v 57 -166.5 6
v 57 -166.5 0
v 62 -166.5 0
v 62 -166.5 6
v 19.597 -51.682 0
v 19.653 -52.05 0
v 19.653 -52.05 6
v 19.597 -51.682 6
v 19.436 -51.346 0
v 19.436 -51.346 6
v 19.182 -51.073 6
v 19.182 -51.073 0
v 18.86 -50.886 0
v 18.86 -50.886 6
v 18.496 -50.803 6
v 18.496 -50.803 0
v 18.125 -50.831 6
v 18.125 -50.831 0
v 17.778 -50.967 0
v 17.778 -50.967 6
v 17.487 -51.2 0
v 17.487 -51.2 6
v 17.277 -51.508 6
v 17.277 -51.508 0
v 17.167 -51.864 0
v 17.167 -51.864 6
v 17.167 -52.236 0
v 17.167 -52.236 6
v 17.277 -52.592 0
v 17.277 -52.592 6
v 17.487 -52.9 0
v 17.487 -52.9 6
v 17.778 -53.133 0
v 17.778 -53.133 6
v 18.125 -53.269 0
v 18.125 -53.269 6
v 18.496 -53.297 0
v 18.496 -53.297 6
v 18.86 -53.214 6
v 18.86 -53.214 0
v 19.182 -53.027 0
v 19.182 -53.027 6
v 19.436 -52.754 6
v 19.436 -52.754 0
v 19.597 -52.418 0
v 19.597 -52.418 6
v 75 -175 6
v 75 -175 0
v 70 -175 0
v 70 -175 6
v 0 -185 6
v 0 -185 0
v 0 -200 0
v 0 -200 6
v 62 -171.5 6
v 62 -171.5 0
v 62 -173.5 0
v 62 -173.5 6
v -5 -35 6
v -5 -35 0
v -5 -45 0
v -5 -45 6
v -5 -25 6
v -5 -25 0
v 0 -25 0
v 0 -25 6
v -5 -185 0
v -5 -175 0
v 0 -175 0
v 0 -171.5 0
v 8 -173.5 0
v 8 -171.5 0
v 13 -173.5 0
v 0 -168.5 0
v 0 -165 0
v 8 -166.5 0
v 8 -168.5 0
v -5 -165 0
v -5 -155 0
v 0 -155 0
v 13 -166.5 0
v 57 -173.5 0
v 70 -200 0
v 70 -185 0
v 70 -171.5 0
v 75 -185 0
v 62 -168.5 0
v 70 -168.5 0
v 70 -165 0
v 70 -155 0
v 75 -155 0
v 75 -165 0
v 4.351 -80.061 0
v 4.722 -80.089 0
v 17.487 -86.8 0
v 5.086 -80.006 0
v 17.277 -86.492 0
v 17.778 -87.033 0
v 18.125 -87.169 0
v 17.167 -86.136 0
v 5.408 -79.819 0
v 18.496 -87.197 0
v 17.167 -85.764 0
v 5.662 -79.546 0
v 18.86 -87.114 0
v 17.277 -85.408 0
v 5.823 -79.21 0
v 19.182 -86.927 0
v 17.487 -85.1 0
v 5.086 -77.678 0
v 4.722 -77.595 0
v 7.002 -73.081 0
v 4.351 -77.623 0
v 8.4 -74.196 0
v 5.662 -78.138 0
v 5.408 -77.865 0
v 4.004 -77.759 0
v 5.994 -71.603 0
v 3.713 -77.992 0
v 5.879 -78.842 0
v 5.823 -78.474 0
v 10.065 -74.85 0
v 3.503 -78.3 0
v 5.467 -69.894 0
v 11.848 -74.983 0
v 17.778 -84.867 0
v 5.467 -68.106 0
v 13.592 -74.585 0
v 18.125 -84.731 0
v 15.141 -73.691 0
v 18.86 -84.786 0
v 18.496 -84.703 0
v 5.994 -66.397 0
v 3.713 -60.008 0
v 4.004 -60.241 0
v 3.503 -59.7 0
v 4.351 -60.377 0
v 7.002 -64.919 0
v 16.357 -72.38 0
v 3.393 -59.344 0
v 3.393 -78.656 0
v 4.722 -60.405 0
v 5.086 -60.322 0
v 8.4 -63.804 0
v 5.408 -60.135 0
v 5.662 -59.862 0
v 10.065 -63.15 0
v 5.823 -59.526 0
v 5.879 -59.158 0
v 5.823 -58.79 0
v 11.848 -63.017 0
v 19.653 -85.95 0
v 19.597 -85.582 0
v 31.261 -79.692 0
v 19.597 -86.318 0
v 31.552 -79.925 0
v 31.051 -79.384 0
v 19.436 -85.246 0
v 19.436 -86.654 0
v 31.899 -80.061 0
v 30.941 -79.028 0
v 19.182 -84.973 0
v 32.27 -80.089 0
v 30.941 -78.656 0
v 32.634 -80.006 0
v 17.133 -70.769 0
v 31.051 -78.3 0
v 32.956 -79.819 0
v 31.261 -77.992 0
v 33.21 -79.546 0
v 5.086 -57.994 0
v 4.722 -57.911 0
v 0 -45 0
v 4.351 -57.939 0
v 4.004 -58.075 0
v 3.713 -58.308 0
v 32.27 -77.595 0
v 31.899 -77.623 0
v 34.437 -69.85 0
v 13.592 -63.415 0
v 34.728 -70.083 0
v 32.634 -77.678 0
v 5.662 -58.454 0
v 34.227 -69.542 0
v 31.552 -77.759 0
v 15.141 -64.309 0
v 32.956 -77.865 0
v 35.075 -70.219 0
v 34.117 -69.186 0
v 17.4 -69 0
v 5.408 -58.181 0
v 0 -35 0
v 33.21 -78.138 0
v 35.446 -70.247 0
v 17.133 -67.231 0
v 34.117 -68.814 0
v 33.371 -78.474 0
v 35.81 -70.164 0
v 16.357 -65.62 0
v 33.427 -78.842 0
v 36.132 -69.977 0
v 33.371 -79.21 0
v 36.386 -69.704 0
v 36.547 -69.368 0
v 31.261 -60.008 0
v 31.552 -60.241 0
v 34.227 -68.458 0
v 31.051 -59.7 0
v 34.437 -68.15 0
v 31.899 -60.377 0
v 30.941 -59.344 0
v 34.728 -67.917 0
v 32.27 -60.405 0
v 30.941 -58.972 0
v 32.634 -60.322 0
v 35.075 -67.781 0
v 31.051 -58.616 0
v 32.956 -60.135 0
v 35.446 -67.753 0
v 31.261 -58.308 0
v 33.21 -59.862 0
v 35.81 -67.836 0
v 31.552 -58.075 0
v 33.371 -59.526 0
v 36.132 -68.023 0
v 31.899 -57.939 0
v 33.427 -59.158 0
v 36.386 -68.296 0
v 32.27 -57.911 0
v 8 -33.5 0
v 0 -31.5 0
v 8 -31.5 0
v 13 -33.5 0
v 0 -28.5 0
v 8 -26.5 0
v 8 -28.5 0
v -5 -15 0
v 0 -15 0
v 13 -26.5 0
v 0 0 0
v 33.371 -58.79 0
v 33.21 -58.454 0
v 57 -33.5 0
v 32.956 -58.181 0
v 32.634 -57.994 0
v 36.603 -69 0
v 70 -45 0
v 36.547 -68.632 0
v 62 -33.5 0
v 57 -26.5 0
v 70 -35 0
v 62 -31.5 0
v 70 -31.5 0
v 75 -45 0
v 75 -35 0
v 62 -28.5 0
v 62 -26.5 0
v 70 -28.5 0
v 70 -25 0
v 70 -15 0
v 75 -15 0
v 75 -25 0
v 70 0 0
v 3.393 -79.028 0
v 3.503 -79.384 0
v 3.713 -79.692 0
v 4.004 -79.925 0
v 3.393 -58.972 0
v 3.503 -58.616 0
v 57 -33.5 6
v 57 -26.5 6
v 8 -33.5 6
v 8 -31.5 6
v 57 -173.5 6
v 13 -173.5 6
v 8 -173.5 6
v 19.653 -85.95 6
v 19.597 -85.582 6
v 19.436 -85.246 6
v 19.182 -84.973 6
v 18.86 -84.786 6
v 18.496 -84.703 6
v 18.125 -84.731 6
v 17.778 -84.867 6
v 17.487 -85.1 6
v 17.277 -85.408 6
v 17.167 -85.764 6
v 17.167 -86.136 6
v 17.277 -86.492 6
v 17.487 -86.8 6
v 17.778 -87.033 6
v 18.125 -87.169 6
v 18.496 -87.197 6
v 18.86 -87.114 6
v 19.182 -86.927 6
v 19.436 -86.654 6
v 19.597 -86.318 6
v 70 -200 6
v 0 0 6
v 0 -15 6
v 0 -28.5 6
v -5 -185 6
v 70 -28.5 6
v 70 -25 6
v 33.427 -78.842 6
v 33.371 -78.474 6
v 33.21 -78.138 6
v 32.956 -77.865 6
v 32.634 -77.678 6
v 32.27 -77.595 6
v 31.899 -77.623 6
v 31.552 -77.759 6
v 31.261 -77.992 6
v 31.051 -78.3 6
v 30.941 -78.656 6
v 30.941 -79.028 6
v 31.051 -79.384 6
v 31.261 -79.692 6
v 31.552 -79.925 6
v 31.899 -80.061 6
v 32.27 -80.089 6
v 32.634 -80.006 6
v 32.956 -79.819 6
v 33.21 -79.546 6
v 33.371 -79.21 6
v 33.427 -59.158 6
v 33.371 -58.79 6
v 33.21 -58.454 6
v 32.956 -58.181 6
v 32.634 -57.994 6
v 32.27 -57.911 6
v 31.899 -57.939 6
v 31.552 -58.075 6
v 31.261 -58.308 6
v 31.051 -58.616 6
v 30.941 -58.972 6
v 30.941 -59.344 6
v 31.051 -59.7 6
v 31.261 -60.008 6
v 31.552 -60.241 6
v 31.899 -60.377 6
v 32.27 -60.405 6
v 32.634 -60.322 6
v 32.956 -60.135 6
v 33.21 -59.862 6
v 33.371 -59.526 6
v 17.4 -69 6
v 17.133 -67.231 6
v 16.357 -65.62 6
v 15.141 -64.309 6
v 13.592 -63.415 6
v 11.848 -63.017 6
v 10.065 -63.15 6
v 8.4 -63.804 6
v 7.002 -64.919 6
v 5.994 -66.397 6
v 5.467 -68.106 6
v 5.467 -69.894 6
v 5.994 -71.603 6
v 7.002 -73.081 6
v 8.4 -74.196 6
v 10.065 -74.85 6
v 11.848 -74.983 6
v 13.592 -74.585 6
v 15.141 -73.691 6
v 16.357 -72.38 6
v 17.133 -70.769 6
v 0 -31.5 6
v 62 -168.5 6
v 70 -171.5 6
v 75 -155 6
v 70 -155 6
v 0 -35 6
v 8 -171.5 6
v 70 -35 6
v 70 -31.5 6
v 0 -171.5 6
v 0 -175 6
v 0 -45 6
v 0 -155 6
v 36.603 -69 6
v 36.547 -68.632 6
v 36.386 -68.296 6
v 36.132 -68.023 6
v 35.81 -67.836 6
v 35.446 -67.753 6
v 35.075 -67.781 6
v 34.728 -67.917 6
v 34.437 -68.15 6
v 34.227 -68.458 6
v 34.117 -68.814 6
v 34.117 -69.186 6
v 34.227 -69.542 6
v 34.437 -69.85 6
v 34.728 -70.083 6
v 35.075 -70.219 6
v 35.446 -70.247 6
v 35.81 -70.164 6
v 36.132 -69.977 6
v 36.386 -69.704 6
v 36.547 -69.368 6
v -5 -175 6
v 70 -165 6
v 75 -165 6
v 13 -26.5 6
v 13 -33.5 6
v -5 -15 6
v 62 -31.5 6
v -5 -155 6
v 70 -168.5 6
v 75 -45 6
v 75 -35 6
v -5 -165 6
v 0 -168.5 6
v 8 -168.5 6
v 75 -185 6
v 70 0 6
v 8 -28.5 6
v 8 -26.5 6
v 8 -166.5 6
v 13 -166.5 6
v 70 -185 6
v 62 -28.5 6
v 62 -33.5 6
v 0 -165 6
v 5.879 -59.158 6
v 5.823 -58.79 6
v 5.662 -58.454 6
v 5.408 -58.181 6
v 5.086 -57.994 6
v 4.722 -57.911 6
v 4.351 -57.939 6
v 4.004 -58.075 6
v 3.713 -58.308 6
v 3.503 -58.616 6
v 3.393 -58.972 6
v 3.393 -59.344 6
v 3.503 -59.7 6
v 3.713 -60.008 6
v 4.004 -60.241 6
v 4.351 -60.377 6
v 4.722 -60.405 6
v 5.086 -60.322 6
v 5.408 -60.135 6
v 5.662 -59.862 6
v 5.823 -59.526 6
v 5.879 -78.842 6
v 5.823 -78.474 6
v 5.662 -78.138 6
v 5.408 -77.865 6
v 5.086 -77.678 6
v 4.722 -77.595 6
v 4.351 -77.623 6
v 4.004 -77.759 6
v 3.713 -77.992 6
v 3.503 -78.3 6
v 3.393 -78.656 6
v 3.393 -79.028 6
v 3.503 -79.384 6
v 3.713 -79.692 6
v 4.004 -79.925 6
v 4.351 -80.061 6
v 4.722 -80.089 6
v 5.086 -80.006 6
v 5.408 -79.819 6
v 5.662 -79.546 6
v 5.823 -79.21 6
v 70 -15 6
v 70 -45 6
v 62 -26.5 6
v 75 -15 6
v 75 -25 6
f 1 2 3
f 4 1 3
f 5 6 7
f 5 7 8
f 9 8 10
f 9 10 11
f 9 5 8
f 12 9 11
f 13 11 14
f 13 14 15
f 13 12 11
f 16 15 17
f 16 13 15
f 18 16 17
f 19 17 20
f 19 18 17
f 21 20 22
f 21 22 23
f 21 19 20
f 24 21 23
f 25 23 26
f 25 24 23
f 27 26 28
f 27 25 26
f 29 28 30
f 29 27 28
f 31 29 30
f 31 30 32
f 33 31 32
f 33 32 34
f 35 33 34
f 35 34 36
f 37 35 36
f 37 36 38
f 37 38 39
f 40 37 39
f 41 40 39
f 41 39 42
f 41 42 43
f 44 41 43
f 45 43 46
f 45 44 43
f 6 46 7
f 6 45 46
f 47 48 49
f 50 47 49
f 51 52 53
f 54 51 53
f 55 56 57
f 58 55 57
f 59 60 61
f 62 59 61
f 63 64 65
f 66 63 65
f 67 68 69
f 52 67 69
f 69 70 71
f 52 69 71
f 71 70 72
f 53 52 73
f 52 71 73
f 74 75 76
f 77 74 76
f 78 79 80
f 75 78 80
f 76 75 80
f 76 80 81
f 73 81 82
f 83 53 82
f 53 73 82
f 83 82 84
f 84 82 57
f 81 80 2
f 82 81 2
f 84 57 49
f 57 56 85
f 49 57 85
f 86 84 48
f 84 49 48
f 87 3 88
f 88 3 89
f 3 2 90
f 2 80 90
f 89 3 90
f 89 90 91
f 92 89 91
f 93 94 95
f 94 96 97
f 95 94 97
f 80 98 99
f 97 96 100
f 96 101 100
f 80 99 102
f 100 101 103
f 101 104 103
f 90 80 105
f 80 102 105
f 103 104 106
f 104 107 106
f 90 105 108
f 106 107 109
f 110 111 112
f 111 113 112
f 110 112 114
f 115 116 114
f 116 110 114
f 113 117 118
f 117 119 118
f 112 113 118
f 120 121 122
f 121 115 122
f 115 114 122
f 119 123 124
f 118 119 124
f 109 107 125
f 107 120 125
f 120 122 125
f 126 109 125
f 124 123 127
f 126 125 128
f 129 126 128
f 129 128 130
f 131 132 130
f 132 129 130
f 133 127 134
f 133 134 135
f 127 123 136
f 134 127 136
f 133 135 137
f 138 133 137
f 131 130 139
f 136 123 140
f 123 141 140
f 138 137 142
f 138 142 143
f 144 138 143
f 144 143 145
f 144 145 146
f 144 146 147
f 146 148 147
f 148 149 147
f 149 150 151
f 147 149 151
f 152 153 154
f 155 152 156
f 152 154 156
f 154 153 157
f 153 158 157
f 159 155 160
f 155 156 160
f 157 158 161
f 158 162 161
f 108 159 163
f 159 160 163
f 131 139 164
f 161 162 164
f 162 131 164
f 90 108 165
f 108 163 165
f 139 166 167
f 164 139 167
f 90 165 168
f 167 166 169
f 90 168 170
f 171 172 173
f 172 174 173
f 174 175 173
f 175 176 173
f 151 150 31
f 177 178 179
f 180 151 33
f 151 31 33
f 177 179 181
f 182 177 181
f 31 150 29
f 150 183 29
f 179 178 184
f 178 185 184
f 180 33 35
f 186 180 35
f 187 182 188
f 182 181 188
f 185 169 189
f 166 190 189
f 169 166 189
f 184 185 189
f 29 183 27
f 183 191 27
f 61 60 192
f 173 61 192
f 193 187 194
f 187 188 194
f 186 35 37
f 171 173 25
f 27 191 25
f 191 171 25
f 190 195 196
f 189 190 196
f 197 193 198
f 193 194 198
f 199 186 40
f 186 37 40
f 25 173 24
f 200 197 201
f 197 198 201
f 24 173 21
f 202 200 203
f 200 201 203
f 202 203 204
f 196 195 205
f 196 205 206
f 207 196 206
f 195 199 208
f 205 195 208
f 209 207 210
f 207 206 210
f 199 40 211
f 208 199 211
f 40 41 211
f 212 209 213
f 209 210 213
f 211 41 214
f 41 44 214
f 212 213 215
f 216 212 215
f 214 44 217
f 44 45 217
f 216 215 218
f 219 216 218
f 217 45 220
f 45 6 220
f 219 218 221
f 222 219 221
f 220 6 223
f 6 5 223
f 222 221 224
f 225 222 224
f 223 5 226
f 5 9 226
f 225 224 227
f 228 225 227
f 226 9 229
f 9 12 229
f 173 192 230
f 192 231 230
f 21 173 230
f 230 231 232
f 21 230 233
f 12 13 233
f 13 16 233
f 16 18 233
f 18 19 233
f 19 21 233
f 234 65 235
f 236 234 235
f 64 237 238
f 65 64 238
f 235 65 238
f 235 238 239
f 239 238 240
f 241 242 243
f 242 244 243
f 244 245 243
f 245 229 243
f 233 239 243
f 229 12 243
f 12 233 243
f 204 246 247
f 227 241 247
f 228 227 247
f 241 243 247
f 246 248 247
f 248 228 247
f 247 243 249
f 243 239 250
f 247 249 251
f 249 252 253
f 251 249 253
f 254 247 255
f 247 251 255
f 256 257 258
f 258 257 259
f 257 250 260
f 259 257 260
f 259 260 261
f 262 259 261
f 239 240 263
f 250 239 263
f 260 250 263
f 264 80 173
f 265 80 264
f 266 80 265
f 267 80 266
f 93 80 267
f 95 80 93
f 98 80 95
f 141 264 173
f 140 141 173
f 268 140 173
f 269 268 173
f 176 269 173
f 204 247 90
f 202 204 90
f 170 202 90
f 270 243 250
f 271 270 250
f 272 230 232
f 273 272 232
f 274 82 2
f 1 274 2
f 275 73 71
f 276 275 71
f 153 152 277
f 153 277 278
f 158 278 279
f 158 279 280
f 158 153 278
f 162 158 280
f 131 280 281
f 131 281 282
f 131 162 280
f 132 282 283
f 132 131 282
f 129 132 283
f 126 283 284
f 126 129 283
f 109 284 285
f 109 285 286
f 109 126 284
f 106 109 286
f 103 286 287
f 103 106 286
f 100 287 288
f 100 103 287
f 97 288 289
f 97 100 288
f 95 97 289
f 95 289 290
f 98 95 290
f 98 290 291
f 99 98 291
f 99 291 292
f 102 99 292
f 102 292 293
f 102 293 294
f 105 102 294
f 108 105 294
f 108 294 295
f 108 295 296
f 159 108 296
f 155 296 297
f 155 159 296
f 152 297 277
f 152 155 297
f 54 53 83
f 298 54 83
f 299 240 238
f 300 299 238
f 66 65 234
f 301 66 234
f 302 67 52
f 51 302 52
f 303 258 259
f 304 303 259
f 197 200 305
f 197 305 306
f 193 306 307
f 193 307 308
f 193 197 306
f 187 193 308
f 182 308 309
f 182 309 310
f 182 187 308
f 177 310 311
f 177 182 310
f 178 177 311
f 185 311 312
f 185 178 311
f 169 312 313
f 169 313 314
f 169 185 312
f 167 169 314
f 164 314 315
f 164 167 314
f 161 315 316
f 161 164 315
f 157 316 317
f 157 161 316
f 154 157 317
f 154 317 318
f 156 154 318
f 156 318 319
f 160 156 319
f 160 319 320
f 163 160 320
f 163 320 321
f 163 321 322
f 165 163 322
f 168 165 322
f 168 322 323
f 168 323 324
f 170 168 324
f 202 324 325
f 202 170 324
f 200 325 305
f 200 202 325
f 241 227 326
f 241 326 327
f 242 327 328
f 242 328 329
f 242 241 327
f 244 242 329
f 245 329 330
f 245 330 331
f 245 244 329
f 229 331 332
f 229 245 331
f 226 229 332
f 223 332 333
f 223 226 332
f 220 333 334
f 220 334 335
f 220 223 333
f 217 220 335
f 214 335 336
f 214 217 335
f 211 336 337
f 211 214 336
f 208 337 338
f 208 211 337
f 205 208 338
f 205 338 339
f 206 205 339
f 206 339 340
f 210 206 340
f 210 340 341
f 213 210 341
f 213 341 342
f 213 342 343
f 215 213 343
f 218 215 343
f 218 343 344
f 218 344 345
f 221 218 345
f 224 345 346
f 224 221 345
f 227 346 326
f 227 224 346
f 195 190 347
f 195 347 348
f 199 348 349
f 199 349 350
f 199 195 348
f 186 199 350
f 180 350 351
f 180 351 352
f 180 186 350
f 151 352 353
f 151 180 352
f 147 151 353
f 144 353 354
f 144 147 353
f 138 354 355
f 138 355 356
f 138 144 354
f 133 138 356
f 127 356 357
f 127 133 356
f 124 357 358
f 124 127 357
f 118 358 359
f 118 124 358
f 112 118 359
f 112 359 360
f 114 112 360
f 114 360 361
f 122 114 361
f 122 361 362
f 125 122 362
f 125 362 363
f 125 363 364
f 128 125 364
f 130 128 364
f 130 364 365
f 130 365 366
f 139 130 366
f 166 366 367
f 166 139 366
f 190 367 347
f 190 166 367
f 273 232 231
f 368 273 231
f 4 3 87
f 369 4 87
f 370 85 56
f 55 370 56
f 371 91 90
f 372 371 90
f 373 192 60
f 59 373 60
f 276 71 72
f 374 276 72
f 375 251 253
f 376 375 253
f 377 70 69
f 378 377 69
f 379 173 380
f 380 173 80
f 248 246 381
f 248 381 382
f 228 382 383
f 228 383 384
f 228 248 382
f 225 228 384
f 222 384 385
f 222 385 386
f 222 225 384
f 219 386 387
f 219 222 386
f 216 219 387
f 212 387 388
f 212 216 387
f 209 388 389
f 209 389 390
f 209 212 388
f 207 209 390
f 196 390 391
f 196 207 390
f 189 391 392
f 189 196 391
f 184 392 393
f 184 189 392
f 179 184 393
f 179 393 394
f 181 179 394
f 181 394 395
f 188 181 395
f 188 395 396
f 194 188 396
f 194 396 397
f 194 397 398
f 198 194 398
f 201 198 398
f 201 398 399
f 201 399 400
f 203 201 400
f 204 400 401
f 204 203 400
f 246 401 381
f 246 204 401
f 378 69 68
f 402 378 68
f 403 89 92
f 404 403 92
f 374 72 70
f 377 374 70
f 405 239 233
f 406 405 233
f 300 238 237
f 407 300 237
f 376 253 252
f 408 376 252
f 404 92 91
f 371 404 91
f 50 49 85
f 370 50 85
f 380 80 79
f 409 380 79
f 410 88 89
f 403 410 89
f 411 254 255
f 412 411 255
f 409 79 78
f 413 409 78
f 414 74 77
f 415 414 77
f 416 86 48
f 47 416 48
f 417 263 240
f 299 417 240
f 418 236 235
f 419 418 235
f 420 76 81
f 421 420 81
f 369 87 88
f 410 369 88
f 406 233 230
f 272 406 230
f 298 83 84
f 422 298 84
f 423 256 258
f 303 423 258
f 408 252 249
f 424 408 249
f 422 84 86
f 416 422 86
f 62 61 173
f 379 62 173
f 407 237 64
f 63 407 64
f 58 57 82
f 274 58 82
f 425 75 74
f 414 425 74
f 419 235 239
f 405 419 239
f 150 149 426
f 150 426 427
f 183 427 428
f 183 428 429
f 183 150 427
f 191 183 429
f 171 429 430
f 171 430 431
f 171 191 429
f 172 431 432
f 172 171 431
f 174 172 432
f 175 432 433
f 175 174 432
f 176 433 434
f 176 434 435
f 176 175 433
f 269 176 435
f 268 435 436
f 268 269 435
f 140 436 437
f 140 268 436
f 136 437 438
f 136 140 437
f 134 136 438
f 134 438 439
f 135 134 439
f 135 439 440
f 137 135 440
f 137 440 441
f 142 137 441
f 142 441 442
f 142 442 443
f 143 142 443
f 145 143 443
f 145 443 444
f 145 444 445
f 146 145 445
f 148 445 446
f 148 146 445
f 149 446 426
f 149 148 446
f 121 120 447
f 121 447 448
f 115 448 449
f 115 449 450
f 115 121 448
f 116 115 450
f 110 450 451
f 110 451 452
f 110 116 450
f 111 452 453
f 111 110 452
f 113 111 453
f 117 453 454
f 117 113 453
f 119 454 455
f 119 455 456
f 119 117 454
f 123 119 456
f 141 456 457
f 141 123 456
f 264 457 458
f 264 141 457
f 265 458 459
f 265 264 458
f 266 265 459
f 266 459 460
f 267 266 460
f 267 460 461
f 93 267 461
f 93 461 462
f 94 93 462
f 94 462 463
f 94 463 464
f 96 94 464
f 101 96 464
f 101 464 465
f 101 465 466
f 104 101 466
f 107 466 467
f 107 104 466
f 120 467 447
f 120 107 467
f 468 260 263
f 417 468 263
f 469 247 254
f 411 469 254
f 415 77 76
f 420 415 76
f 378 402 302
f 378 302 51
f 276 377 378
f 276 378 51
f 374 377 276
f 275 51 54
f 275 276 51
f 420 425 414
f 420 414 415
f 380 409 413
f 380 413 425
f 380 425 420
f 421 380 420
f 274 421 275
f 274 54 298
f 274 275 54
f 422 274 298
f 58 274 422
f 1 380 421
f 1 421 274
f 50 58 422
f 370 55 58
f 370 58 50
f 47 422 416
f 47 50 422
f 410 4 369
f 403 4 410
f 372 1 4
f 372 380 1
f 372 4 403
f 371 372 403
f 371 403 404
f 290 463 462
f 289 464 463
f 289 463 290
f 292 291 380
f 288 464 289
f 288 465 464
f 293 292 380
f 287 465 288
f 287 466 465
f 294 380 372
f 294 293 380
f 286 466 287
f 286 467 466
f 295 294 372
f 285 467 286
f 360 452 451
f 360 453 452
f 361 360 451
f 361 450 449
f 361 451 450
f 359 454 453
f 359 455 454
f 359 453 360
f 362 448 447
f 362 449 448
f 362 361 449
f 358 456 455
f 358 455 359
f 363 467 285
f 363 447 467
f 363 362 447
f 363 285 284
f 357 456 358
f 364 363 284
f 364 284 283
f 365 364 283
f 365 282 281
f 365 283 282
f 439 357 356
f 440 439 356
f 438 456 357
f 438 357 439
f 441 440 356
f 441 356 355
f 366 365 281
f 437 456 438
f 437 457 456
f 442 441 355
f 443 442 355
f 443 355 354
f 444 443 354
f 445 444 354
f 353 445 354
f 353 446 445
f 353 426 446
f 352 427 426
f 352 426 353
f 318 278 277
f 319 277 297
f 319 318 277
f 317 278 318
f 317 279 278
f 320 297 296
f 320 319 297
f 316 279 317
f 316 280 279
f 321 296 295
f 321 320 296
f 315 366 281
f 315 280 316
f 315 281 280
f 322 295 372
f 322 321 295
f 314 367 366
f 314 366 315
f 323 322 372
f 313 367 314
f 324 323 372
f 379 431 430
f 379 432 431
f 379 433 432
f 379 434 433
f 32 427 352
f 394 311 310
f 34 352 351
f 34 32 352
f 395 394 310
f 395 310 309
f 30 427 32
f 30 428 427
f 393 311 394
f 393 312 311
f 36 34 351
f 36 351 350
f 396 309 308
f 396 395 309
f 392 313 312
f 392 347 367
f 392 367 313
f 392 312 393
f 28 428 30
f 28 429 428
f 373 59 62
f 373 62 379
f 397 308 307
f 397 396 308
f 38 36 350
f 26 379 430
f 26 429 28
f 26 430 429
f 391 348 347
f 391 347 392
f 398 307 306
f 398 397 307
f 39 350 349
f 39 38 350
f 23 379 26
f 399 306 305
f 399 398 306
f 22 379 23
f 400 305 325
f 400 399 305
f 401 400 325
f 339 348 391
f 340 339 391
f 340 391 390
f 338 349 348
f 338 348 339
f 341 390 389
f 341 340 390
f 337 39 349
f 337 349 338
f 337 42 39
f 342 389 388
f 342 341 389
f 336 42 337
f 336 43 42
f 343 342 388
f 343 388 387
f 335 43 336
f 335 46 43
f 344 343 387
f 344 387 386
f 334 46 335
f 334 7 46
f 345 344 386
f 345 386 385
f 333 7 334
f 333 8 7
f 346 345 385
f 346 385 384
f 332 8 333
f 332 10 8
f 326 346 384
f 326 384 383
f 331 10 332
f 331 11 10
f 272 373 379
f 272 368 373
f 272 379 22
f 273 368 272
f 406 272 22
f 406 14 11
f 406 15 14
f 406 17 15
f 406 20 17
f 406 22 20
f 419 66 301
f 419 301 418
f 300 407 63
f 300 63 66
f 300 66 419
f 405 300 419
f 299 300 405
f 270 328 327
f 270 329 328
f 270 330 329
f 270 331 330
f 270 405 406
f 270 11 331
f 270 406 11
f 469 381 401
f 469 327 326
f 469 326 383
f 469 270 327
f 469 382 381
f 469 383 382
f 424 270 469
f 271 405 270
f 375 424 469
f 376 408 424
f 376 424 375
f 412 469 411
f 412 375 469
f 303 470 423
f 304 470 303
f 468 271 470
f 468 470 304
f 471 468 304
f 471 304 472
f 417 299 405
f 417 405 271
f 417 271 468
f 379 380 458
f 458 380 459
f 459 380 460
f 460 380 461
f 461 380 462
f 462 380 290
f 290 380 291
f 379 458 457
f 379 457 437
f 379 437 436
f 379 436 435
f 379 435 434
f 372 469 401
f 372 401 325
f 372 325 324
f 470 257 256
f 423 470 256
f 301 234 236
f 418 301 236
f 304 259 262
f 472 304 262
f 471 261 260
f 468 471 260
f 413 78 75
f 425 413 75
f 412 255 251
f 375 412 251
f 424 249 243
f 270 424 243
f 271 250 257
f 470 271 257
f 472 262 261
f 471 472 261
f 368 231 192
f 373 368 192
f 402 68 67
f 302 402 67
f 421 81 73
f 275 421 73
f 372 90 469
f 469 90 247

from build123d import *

# Parameters (mm, degrees)
MODEL_R                  = 1.25
MODEL_R_2                = 6
RESSALTO_EXTRUS_O1_DEPTH = 6


with BuildPart() as part:
    # Model → Ressalto-extrusão1 (new body)
    with BuildSketch(Plane.XY):
        Polygon((70, -31.5), (62, -31.5), (62, -33.5), (57, -33.5), (57, -26.5), (62, -26.5), (62, -28.5), (70, -28.5), (70, -25), (75, -25), (75, -15), (70, -15), (70, 0), (0, 0), (0, -15), (-5, -15), (-5, -25), (0, -25), (0, -28.5), (8, -28.5), (8, -26.5), (13, -26.5), (13, -33.5), (8, -33.5), (8, -31.5), (0, -31.5), (0, -35), (-5, -35), (-5, -45), (0, -45), (0, -155), (-5, -155), (-5, -165), (0, -165), (0, -168.5), (8, -168.5), (8, -166.5), (13, -166.5), (13, -173.5), (8, -173.5), (8, -171.5), (0, -171.5), (0, -175), (-5, -175), (-5, -185), (0, -185), (0, -200), (70, -200), (70, -185), (75, -185), (75, -175), (70, -175), (70, -171.5), (62, -171.5), (62, -173.5), (57, -173.5), (57, -166.5), (62, -166.5), (62, -168.5), (70, -168.5), (70, -165), (75, -165), (75, -155), (70, -155), (70, -45), (75, -45), (75, -35), (70, -35), align=None)
        with Locations((32.177, -78.842)):
            Circle(MODEL_R, mode=Mode.SUBTRACT)
        with Locations((35.353, -69)):
            Circle(MODEL_R, mode=Mode.SUBTRACT)
        with Locations((32.177, -59.158)):
            Circle(MODEL_R, mode=Mode.SUBTRACT)
        with Locations((18.403, -52.05)):
            Circle(MODEL_R, mode=Mode.SUBTRACT)
        with Locations((4.629, -59.158)):
            Circle(MODEL_R, mode=Mode.SUBTRACT)
        with Locations((4.629, -78.842)):
            Circle(MODEL_R, mode=Mode.SUBTRACT)
        with Locations((18.403, -85.95)):
            Circle(MODEL_R, mode=Mode.SUBTRACT)
        with Locations((11.4, -69)):
            Circle(MODEL_R_2, mode=Mode.SUBTRACT)
    extrude(amount=RESSALTO_EXTRUS_O1_DEPTH)


solid = part.part
